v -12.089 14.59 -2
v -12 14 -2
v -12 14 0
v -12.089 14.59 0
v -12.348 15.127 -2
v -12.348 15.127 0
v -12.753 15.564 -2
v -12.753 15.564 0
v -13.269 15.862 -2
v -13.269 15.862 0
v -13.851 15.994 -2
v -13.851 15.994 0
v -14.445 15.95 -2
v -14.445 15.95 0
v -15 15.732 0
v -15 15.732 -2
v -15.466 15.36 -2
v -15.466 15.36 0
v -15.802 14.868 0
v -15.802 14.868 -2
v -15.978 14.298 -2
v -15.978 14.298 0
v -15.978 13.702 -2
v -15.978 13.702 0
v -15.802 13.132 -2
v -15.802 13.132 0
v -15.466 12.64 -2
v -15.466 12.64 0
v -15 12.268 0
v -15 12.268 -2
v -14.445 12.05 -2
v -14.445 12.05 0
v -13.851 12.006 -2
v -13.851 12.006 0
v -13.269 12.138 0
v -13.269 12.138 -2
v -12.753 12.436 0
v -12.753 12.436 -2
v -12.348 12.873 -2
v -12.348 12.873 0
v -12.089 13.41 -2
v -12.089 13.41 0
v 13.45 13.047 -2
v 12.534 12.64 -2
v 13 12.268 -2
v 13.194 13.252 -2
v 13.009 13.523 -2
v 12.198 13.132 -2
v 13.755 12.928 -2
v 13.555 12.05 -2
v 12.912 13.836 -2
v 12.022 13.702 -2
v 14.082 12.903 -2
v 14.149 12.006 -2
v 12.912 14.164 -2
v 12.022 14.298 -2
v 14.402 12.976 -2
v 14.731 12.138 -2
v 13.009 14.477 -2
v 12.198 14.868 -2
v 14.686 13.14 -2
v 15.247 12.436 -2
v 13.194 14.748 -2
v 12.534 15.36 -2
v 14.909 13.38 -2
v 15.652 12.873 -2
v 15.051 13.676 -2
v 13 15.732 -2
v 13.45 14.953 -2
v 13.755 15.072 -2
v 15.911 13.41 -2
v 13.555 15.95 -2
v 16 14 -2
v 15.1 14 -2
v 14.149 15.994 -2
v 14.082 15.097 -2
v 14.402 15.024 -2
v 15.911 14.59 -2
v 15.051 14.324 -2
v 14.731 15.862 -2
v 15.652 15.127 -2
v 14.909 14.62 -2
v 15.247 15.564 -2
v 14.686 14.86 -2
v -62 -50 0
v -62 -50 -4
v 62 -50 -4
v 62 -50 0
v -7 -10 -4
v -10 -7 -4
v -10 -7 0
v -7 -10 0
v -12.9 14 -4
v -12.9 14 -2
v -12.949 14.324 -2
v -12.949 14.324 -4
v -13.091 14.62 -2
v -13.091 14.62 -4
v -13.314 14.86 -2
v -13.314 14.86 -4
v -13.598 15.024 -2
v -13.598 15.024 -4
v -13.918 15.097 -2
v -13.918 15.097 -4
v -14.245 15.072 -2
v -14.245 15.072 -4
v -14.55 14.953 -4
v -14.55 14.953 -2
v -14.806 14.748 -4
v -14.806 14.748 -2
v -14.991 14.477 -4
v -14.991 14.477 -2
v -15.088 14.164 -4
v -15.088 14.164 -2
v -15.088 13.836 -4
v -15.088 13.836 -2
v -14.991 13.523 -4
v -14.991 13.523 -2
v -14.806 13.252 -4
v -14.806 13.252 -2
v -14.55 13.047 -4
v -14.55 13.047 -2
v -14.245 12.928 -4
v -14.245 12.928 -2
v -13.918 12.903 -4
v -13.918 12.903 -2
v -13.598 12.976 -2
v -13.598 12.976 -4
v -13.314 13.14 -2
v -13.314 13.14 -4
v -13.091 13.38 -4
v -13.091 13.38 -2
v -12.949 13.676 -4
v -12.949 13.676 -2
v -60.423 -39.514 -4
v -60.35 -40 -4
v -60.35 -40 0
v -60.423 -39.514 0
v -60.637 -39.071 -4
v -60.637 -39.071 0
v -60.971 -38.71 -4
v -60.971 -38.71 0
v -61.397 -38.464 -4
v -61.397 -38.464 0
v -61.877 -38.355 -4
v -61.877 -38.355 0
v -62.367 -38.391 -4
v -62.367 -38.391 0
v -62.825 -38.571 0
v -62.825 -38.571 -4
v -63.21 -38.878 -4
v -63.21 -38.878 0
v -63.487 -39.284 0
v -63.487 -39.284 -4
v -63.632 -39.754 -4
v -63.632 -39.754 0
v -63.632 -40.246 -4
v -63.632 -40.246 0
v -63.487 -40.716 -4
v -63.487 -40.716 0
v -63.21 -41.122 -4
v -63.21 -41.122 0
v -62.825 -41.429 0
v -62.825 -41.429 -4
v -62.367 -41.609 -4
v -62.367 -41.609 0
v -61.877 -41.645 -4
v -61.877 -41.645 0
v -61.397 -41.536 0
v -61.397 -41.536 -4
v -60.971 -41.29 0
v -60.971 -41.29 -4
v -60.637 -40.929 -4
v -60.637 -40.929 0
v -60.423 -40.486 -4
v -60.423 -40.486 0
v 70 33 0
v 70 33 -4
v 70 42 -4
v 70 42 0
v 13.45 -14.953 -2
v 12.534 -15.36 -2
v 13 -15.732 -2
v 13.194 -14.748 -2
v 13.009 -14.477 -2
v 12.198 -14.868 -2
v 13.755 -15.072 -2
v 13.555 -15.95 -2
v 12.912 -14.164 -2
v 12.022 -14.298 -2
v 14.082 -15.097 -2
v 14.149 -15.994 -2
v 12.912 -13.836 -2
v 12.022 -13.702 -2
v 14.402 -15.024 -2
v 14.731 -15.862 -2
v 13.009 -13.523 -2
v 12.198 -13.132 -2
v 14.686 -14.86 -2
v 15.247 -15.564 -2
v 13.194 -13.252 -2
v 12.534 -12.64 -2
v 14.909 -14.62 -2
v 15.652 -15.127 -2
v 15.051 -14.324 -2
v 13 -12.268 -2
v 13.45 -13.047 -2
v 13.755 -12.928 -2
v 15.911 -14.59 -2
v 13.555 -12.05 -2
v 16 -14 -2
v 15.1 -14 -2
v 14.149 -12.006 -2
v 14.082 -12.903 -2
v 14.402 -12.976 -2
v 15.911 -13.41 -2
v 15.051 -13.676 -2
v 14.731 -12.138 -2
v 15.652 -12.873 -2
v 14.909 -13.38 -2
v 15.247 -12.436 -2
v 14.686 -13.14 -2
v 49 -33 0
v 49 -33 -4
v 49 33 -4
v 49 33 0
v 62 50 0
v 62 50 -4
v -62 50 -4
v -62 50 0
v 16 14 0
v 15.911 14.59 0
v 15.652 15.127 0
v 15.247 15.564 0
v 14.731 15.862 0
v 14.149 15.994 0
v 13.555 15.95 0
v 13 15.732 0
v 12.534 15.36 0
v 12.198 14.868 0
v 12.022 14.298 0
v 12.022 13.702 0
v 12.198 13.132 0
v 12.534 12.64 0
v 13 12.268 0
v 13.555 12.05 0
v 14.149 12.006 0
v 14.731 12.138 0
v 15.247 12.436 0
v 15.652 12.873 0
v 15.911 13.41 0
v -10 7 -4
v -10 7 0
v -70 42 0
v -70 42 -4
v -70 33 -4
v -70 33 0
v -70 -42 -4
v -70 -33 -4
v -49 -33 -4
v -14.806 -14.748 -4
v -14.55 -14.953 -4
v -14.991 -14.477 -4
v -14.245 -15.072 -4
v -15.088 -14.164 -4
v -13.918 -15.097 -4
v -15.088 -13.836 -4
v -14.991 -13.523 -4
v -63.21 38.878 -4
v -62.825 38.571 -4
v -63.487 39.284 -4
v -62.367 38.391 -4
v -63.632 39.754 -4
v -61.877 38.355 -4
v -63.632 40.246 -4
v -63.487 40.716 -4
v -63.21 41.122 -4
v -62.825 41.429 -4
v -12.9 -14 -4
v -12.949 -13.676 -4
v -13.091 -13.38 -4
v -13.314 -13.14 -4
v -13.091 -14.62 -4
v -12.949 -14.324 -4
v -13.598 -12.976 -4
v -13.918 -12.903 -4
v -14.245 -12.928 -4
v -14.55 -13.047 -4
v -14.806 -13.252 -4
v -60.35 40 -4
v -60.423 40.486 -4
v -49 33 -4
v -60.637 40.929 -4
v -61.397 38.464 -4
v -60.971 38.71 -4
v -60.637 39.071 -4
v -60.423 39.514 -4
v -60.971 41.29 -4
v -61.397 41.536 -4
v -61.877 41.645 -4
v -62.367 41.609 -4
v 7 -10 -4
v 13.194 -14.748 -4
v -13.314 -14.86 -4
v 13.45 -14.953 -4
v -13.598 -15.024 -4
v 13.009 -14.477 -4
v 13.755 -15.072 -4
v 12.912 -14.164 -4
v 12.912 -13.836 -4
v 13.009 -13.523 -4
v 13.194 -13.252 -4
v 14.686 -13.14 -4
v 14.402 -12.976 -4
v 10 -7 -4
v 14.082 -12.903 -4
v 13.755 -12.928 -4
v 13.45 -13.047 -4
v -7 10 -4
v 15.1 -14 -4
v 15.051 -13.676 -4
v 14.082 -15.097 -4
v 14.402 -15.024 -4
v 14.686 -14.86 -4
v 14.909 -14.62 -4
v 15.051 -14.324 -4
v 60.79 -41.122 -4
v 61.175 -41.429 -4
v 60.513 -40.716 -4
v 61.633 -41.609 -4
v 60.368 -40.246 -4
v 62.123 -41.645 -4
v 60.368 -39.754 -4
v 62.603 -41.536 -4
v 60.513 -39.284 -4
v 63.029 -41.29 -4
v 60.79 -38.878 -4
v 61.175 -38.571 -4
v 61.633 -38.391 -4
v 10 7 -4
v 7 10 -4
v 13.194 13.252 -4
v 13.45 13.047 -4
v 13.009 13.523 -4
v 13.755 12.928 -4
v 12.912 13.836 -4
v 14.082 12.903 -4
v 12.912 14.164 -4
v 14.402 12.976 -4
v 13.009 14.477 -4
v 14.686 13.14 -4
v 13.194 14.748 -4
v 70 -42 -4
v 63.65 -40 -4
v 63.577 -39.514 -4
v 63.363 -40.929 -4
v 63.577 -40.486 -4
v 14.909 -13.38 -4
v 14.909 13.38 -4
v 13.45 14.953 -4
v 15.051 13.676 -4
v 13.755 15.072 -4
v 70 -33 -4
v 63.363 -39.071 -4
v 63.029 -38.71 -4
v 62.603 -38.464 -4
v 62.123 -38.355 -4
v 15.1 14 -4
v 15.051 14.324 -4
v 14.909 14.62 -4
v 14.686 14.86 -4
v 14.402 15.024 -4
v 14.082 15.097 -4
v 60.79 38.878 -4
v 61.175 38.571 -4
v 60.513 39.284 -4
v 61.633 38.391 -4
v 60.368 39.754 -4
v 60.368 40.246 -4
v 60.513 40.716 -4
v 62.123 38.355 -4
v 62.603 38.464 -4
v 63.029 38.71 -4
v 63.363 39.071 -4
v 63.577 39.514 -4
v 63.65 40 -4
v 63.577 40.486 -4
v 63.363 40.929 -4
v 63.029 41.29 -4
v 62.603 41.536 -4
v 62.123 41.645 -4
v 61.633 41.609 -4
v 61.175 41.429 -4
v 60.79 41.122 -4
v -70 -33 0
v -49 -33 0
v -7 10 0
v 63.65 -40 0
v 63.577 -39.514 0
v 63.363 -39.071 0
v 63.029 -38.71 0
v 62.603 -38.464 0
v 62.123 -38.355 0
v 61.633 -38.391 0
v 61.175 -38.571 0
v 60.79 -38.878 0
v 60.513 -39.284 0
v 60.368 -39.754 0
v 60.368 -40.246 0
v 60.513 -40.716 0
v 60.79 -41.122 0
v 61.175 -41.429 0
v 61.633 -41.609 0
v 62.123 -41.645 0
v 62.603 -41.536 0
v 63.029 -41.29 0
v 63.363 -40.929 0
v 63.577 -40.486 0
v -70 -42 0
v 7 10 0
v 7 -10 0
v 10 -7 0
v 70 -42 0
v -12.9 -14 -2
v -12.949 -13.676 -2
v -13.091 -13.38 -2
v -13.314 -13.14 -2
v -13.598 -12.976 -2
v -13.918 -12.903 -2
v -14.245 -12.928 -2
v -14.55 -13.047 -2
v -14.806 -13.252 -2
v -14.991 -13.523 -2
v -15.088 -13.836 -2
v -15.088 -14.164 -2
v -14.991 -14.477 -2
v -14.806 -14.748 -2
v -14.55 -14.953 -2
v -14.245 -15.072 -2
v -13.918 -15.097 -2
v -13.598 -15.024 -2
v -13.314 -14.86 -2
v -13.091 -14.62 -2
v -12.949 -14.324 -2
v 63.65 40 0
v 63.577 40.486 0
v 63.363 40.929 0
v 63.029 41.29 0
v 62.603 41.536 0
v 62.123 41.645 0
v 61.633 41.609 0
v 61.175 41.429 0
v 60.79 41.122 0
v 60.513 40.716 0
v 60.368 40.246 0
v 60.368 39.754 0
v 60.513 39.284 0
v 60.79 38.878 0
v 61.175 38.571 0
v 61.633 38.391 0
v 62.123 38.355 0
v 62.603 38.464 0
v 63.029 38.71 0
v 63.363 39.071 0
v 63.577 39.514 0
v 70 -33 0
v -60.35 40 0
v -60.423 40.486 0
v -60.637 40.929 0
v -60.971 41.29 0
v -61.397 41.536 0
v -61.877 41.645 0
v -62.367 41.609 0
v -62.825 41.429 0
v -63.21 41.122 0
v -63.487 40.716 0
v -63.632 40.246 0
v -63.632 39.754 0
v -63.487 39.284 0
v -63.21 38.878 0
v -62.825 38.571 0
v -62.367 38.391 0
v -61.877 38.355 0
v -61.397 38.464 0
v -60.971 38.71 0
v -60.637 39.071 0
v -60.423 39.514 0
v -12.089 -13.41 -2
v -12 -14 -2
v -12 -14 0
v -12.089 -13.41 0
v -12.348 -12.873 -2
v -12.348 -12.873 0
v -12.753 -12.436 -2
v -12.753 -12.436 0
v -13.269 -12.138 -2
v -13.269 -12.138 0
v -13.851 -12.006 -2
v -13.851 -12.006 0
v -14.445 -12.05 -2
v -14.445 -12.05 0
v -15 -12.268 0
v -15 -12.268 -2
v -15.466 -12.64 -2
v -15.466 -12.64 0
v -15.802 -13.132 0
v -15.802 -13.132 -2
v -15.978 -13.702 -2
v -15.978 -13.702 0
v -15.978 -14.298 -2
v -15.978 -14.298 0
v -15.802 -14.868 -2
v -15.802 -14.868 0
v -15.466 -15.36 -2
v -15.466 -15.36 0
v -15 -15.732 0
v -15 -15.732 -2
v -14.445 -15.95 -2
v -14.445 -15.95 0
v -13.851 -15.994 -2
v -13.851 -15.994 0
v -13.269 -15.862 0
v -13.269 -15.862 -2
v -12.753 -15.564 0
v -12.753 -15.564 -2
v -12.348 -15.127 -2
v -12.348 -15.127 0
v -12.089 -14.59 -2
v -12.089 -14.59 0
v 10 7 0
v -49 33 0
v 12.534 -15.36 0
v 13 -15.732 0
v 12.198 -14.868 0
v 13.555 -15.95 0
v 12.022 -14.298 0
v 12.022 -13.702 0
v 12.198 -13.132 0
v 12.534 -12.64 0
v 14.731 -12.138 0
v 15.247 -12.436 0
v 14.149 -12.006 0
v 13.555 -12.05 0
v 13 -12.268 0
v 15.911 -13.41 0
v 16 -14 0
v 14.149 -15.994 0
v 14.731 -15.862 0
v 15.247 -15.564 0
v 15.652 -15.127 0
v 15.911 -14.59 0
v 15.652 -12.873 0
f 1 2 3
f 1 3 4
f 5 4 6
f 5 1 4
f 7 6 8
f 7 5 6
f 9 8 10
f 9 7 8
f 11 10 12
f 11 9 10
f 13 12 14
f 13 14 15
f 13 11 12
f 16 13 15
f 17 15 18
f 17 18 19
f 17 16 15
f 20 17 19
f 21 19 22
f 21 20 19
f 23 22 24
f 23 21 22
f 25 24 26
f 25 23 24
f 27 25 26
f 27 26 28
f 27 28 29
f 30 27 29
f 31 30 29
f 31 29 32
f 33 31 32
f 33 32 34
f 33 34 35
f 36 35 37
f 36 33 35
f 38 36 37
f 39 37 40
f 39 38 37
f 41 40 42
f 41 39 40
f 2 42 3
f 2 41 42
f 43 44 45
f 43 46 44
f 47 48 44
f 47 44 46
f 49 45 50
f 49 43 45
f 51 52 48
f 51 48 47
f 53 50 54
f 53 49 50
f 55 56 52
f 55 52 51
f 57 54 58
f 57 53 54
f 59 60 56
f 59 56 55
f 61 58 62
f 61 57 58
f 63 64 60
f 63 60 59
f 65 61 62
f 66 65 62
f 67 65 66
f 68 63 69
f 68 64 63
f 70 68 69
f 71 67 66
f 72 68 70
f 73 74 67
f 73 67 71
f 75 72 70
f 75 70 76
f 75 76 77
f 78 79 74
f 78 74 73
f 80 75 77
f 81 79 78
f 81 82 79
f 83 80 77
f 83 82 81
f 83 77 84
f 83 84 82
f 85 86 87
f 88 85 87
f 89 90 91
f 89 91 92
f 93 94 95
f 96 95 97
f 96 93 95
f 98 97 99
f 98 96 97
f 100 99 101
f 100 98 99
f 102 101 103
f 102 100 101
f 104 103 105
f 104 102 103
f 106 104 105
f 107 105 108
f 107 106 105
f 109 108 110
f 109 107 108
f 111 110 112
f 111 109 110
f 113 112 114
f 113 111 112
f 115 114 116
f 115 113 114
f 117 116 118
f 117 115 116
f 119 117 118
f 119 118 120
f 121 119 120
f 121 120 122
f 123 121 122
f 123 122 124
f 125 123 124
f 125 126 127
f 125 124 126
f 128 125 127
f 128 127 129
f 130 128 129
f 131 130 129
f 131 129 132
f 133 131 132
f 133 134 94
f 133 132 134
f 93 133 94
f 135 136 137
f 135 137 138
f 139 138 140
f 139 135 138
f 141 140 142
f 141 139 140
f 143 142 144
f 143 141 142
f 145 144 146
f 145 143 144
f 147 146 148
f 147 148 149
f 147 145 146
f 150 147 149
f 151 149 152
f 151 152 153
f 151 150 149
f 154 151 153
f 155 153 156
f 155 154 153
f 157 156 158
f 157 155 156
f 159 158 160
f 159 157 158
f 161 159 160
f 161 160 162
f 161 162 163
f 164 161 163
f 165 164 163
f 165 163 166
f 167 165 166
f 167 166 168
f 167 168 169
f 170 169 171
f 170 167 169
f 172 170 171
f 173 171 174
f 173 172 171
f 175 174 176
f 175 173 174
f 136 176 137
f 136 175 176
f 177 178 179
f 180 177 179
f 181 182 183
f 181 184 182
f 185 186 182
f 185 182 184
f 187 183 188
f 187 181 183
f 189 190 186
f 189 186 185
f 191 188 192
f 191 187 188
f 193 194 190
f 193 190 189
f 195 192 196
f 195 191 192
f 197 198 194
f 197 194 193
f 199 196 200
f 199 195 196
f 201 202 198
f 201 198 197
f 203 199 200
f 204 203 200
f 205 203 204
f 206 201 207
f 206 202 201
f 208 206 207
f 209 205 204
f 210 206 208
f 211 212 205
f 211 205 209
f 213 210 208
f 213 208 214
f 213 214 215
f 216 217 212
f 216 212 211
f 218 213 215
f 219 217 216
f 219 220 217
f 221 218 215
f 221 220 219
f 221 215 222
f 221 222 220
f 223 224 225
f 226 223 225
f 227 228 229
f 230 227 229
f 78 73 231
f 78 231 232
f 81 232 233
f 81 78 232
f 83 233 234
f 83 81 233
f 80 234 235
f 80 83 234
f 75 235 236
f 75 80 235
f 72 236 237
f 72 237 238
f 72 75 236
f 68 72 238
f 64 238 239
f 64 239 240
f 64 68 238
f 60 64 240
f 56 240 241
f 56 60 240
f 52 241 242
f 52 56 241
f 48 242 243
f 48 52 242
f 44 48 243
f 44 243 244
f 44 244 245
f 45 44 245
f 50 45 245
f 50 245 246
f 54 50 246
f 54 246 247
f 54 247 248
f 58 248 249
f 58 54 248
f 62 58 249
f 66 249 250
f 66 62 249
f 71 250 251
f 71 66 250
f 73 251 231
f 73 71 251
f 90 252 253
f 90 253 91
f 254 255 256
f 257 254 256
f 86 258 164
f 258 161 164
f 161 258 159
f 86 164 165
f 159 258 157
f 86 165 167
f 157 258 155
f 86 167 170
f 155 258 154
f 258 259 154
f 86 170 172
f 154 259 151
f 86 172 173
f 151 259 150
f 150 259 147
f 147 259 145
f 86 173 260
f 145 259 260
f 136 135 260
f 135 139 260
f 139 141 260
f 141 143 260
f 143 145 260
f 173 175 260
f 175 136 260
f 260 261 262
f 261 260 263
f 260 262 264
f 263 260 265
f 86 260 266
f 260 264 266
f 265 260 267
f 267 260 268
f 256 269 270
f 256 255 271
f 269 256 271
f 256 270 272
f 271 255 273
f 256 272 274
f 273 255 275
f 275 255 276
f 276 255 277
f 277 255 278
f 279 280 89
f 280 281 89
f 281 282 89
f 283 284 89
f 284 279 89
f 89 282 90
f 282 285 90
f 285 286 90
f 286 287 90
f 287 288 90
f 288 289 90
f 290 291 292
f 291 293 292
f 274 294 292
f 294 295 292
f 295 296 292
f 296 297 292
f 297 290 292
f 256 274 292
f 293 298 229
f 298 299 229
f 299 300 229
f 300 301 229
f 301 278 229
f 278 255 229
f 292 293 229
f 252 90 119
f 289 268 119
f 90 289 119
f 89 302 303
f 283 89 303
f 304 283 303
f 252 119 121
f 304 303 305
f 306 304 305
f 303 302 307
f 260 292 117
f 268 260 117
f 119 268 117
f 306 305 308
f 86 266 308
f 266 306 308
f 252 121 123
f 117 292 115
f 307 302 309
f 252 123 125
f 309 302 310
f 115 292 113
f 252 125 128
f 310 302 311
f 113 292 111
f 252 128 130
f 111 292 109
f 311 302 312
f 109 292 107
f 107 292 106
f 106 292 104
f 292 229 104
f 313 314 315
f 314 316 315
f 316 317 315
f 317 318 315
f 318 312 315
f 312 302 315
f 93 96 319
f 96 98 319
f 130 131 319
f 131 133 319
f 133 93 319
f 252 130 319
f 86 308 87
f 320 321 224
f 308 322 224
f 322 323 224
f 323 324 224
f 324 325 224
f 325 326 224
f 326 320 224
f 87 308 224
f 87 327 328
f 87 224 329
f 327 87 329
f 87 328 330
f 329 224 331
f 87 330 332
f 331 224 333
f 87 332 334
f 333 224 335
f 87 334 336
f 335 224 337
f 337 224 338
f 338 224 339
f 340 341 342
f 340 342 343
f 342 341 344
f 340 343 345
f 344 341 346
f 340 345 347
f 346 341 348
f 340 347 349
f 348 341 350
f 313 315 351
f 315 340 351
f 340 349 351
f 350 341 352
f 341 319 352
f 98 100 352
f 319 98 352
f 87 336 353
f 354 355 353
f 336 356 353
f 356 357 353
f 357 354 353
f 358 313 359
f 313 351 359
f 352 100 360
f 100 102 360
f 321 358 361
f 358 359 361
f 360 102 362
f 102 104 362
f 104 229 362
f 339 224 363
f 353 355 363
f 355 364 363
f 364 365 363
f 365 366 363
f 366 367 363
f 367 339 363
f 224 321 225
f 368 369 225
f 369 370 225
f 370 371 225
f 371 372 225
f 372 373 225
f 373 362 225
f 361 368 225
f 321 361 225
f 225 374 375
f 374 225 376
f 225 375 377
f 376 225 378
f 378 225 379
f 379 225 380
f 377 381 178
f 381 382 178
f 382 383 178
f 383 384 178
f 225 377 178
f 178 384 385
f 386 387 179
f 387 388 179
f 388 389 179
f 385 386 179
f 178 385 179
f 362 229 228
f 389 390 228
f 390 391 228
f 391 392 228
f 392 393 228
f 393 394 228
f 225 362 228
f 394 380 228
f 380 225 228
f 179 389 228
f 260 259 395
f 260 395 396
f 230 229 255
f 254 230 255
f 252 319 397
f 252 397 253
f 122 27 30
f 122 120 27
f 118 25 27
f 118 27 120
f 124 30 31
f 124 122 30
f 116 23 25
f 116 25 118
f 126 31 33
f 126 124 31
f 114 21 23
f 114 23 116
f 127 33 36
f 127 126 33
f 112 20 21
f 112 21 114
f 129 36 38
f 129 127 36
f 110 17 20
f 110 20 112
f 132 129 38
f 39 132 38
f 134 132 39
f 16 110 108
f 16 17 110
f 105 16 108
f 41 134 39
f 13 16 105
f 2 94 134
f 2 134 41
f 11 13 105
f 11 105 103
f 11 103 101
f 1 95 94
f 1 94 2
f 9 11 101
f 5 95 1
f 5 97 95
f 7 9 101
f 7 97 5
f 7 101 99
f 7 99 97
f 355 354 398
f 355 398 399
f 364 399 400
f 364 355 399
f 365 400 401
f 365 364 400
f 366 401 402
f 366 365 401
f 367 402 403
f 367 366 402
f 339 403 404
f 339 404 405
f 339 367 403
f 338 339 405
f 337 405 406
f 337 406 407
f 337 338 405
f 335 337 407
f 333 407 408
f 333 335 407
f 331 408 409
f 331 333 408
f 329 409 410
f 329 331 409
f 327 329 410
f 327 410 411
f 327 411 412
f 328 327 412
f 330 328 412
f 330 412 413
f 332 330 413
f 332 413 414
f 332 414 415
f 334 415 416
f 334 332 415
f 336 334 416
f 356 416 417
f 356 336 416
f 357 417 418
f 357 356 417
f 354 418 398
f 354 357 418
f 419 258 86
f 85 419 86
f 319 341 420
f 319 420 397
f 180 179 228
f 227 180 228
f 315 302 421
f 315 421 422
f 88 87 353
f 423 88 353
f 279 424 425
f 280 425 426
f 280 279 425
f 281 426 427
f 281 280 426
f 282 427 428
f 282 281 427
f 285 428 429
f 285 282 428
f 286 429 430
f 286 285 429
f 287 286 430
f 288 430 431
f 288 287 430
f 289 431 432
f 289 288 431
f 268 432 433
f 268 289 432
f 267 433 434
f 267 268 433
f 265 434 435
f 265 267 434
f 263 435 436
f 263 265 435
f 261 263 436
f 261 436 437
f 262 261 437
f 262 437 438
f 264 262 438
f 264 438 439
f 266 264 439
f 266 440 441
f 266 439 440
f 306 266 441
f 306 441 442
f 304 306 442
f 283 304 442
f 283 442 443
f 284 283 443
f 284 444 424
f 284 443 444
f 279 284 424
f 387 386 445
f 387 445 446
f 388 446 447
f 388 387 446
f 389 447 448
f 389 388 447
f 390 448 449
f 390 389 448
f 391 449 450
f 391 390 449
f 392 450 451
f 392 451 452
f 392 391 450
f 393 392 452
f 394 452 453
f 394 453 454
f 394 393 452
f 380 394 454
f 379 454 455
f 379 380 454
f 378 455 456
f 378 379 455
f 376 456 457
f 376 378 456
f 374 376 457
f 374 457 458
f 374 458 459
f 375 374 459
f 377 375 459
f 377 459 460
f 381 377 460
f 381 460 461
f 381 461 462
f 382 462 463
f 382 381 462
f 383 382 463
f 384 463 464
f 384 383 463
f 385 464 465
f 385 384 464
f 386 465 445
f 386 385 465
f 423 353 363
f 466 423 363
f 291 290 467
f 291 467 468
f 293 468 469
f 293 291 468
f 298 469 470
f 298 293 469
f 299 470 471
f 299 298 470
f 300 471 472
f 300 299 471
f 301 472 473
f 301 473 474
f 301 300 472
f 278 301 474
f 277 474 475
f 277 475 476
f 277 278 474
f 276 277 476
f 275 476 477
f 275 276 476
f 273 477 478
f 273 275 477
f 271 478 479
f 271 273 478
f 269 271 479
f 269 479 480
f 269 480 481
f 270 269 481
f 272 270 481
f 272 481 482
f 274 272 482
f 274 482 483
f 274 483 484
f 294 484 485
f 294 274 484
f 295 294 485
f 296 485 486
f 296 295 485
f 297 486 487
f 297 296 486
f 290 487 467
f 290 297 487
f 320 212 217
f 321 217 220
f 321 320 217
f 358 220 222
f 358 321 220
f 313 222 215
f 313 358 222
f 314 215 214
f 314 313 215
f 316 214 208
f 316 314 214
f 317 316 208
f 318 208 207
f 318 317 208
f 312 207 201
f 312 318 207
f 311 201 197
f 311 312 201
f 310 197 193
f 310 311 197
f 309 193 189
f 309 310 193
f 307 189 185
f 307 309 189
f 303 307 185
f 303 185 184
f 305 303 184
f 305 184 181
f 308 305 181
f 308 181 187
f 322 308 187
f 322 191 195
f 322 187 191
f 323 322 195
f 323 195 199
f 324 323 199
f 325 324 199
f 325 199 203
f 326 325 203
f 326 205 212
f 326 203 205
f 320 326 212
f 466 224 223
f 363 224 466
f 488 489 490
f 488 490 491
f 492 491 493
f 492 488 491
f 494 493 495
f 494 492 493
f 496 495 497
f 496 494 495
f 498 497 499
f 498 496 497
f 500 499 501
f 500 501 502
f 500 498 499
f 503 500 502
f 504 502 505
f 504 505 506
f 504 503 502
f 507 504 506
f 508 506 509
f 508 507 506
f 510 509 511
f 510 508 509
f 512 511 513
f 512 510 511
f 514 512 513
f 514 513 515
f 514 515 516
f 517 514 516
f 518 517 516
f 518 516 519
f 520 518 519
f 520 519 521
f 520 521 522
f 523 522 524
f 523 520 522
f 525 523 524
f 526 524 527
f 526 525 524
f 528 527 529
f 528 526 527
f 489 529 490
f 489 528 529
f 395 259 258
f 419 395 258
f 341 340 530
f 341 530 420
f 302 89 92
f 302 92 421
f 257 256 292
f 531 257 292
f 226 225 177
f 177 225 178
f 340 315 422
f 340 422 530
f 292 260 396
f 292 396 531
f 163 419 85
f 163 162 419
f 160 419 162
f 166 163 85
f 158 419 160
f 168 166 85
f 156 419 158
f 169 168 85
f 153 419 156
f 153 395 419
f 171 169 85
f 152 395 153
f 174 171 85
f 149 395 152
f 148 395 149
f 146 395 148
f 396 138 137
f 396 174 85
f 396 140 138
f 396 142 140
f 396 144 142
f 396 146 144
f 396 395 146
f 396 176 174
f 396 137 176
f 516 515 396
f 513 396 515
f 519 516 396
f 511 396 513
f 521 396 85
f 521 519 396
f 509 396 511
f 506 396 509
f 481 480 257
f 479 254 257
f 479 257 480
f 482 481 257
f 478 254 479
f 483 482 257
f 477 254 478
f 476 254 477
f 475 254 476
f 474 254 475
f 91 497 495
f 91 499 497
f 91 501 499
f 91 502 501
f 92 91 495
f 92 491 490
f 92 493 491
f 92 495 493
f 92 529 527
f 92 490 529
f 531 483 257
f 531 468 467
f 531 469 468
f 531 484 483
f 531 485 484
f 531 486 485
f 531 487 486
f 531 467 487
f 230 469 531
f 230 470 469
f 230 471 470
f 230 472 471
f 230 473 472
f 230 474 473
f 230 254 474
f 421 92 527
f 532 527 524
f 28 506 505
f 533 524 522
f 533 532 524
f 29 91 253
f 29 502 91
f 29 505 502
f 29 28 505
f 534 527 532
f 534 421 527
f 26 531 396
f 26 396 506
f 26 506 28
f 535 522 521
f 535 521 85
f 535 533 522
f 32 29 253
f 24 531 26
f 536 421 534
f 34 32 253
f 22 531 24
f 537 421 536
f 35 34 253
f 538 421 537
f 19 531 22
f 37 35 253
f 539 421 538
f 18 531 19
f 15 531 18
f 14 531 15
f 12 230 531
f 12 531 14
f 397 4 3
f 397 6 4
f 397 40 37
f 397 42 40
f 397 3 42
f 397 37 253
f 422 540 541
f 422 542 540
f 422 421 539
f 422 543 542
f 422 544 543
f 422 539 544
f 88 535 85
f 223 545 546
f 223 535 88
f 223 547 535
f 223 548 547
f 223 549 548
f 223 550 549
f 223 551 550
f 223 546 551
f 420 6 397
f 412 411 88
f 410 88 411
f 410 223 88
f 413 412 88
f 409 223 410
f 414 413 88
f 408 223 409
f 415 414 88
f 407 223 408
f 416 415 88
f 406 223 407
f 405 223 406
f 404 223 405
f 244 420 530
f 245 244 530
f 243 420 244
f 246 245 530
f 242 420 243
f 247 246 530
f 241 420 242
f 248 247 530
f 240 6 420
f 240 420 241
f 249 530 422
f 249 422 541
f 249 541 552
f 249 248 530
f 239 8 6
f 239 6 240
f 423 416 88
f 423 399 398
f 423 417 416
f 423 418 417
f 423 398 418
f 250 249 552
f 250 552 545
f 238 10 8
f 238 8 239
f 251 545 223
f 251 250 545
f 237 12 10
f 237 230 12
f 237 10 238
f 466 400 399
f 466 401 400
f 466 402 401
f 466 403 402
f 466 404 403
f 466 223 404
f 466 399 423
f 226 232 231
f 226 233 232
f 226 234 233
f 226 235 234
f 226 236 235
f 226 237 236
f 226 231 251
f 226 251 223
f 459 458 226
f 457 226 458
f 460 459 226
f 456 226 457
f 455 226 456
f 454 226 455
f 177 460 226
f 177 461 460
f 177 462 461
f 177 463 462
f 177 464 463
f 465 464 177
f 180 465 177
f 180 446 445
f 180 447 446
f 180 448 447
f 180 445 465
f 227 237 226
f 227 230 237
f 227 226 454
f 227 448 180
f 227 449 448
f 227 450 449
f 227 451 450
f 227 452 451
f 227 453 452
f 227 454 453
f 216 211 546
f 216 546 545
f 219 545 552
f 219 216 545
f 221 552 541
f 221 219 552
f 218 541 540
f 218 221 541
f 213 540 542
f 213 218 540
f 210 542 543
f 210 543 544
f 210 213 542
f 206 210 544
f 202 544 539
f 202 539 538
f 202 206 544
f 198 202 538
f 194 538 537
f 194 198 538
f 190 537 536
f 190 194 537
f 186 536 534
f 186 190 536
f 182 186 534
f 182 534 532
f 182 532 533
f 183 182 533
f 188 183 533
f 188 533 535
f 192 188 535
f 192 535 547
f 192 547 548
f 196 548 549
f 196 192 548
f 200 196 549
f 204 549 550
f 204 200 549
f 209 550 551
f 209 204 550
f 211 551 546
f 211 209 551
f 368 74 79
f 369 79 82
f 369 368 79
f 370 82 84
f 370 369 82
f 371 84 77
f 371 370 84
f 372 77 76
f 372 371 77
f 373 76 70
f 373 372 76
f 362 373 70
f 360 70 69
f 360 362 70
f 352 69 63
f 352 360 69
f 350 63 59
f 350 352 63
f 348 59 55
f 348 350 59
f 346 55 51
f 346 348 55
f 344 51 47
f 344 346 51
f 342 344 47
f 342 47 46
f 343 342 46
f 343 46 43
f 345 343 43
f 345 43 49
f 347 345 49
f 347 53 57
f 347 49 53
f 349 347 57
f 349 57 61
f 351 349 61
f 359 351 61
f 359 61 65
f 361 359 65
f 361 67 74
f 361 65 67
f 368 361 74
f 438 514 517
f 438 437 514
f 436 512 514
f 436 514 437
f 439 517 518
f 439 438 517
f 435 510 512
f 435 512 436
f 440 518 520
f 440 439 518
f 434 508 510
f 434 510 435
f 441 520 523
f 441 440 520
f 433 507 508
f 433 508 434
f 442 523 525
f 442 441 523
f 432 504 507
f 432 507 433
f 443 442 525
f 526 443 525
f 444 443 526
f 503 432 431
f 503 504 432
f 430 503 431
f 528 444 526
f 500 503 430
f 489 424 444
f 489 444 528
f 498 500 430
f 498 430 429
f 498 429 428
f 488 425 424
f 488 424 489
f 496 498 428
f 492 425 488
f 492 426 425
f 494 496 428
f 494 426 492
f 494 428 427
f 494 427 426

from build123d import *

# Parameters (mm, degrees)
EXTRUDE_START         = -4
SKETCH_1_R            = 1.65
SKETCH_1_R_2          = 1.1
EXTRUDE_266_DEPTH     = 4
CUT_EXTRUDE_START     = -4
SKETCH_2_W            = 32
SKETCH_2_H            = 66
CUT_EXTRUDE_347_DEPTH = 4
CUT_EXTRUDE_START_2   = -2
SKETCH_3_R            = 2
CUT_EXTRUDE_M2_DEPTH  = 2


with BuildPart() as part:
    # 草图1 → Extrude 266 (new body)
    with BuildSketch(Plane.XY.offset(EXTRUDE_START)):
        Polygon((-62, -50), (62, -50), (70, -42), (70, 42), (62, 50), (-62, 50), (-70, 42), (-70, -42), align=None)
        with Locations((-62, -40)):
            Circle(SKETCH_1_R, mode=Mode.SUBTRACT)
        with Locations((-14, -14)):
            Circle(SKETCH_1_R_2, mode=Mode.SUBTRACT)
        with Locations((-62, 40)):
            Circle(SKETCH_1_R, mode=Mode.SUBTRACT)
        with Locations((-14, 14)):
            Circle(SKETCH_1_R_2, mode=Mode.SUBTRACT)
        with Locations((62, -40)):
            Circle(SKETCH_1_R, mode=Mode.SUBTRACT)
        with Locations((14, -14)):
            Circle(SKETCH_1_R_2, mode=Mode.SUBTRACT)
        with Locations((62, 40)):
            Circle(SKETCH_1_R, mode=Mode.SUBTRACT)
        with Locations((14, 14)):
            Circle(SKETCH_1_R_2, mode=Mode.SUBTRACT)
        Polygon((-7, -10), (7, -10), (10, -7), (10, 7), (7, 10), (-7, 10), (-10, 7), (-10, -7), align=None, mode=Mode.SUBTRACT)
    extrude(amount=EXTRUDE_266_DEPTH)

    # 草图2 → Cut-Extrude 347 (cut)
    with BuildSketch(Plane.XY.offset(CUT_EXTRUDE_START)):
        with Locations((65, 0)):
            Rectangle(SKETCH_2_W, SKETCH_2_H)
        with Locations((-65, 0)):
            Rectangle(SKETCH_2_W, SKETCH_2_H)
    extrude(amount=CUT_EXTRUDE_347_DEPTH, mode=Mode.SUBTRACT)

    # 草图3 → M2头部内藏沉台 (cut)
    with BuildSketch(Plane.XY.offset(CUT_EXTRUDE_START_2)):
        with Locations((-14, -14)):
            Circle(SKETCH_3_R)
        with Locations((-14, 14)):
            Circle(SKETCH_3_R)
        with Locations((14, -14)):
            Circle(SKETCH_3_R)
        with Locations((14, 14)):
            Circle(SKETCH_3_R)
    extrude(amount=CUT_EXTRUDE_M2_DEPTH, mode=Mode.SUBTRACT)


solid = part.part
